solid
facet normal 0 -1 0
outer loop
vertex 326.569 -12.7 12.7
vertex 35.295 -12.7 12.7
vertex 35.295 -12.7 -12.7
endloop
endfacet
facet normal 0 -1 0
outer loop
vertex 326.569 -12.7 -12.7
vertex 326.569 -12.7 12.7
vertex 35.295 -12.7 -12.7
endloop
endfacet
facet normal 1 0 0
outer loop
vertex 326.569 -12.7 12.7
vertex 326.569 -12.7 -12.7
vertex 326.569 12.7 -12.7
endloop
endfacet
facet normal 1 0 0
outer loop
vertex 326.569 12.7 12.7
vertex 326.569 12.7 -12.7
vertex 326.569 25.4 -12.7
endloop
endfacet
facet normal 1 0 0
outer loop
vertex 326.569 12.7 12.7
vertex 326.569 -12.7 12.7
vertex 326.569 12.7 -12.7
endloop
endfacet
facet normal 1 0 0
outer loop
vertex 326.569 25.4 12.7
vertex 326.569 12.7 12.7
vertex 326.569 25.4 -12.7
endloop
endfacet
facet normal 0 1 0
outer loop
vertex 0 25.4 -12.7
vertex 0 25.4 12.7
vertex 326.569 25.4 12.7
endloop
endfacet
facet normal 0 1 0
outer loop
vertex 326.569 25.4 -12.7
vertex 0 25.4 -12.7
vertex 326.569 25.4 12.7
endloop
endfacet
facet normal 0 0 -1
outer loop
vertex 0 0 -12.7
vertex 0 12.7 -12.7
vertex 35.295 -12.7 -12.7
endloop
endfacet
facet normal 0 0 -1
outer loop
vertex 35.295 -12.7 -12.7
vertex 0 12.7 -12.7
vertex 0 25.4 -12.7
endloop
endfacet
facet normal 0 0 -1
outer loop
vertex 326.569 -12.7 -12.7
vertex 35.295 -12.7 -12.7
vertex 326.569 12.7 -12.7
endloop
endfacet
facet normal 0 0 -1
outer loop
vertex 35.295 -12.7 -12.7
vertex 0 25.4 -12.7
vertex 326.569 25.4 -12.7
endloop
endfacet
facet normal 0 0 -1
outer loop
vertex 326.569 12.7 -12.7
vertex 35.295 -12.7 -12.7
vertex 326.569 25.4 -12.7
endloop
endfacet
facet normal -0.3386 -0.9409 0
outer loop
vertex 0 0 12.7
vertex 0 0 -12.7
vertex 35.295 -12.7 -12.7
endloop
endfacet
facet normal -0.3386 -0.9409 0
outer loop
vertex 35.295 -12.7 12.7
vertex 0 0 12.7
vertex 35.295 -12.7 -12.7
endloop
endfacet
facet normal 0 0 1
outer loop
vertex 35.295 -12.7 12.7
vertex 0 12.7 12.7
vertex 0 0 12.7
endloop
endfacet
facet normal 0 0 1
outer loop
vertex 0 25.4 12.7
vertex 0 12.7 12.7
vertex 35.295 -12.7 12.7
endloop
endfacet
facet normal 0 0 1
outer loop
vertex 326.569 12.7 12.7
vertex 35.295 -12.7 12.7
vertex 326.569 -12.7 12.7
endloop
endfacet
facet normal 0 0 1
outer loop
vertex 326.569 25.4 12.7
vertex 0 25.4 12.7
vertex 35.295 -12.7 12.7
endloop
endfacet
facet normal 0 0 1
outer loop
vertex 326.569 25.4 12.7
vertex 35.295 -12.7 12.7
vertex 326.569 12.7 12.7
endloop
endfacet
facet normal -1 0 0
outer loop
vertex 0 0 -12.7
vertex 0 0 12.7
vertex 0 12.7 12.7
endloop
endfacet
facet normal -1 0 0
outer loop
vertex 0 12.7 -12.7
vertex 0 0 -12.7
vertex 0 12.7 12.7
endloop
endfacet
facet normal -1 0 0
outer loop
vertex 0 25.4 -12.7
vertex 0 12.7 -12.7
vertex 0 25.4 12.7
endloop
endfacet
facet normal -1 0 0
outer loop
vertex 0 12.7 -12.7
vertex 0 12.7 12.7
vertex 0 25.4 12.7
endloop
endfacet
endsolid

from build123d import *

# Parameters (mm, degrees)
SKETCH1_W               = 25.4
SKETCH1_H               = 25.4
BOSS_EXTRUDE1_DEPTH     = 326.569392859
CUT_EXTRUDE1_DEPTH      = 328.80179736
CUT_EXTRUDE1_DEPTH_BACK = 328.80179736
SKETCH3_W               = 326.569392859
SKETCH3_H               = 12.7
BOSS_EXTRUDE2_DEPTH     = 25.4


with BuildPart() as part:
    # Sketch1 → Boss-Extrude1 (new body)
    with BuildSketch(Plane(origin=(0, 0, 0), x_dir=(0, 0, -1), z_dir=(1, 0, 0))):
        Rectangle(SKETCH1_W, SKETCH1_H)
    extrude(amount=BOSS_EXTRUDE1_DEPTH)

    # Sketch2 → Cut-Extrude1 (cut, two sides: drawn at the far end of the back side and taken through both)
    with BuildSketch(Plane.XY.offset(12.7).offset(-CUT_EXTRUDE1_DEPTH_BACK)):
        Polygon((0, -12.7), (0, 0), (35.294934027, -12.7), align=None)
    extrude(amount=CUT_EXTRUDE1_DEPTH + CUT_EXTRUDE1_DEPTH_BACK, mode=Mode.SUBTRACT)

    # Sketch3 → Boss-Extrude2 (add)
    with BuildSketch(Plane.XY.offset(12.7)):
        with Locations((163.28469643, 19.05)):
            Rectangle(SKETCH3_W, SKETCH3_H)
    extrude(amount=-BOSS_EXTRUDE2_DEPTH)


solid = part.part
